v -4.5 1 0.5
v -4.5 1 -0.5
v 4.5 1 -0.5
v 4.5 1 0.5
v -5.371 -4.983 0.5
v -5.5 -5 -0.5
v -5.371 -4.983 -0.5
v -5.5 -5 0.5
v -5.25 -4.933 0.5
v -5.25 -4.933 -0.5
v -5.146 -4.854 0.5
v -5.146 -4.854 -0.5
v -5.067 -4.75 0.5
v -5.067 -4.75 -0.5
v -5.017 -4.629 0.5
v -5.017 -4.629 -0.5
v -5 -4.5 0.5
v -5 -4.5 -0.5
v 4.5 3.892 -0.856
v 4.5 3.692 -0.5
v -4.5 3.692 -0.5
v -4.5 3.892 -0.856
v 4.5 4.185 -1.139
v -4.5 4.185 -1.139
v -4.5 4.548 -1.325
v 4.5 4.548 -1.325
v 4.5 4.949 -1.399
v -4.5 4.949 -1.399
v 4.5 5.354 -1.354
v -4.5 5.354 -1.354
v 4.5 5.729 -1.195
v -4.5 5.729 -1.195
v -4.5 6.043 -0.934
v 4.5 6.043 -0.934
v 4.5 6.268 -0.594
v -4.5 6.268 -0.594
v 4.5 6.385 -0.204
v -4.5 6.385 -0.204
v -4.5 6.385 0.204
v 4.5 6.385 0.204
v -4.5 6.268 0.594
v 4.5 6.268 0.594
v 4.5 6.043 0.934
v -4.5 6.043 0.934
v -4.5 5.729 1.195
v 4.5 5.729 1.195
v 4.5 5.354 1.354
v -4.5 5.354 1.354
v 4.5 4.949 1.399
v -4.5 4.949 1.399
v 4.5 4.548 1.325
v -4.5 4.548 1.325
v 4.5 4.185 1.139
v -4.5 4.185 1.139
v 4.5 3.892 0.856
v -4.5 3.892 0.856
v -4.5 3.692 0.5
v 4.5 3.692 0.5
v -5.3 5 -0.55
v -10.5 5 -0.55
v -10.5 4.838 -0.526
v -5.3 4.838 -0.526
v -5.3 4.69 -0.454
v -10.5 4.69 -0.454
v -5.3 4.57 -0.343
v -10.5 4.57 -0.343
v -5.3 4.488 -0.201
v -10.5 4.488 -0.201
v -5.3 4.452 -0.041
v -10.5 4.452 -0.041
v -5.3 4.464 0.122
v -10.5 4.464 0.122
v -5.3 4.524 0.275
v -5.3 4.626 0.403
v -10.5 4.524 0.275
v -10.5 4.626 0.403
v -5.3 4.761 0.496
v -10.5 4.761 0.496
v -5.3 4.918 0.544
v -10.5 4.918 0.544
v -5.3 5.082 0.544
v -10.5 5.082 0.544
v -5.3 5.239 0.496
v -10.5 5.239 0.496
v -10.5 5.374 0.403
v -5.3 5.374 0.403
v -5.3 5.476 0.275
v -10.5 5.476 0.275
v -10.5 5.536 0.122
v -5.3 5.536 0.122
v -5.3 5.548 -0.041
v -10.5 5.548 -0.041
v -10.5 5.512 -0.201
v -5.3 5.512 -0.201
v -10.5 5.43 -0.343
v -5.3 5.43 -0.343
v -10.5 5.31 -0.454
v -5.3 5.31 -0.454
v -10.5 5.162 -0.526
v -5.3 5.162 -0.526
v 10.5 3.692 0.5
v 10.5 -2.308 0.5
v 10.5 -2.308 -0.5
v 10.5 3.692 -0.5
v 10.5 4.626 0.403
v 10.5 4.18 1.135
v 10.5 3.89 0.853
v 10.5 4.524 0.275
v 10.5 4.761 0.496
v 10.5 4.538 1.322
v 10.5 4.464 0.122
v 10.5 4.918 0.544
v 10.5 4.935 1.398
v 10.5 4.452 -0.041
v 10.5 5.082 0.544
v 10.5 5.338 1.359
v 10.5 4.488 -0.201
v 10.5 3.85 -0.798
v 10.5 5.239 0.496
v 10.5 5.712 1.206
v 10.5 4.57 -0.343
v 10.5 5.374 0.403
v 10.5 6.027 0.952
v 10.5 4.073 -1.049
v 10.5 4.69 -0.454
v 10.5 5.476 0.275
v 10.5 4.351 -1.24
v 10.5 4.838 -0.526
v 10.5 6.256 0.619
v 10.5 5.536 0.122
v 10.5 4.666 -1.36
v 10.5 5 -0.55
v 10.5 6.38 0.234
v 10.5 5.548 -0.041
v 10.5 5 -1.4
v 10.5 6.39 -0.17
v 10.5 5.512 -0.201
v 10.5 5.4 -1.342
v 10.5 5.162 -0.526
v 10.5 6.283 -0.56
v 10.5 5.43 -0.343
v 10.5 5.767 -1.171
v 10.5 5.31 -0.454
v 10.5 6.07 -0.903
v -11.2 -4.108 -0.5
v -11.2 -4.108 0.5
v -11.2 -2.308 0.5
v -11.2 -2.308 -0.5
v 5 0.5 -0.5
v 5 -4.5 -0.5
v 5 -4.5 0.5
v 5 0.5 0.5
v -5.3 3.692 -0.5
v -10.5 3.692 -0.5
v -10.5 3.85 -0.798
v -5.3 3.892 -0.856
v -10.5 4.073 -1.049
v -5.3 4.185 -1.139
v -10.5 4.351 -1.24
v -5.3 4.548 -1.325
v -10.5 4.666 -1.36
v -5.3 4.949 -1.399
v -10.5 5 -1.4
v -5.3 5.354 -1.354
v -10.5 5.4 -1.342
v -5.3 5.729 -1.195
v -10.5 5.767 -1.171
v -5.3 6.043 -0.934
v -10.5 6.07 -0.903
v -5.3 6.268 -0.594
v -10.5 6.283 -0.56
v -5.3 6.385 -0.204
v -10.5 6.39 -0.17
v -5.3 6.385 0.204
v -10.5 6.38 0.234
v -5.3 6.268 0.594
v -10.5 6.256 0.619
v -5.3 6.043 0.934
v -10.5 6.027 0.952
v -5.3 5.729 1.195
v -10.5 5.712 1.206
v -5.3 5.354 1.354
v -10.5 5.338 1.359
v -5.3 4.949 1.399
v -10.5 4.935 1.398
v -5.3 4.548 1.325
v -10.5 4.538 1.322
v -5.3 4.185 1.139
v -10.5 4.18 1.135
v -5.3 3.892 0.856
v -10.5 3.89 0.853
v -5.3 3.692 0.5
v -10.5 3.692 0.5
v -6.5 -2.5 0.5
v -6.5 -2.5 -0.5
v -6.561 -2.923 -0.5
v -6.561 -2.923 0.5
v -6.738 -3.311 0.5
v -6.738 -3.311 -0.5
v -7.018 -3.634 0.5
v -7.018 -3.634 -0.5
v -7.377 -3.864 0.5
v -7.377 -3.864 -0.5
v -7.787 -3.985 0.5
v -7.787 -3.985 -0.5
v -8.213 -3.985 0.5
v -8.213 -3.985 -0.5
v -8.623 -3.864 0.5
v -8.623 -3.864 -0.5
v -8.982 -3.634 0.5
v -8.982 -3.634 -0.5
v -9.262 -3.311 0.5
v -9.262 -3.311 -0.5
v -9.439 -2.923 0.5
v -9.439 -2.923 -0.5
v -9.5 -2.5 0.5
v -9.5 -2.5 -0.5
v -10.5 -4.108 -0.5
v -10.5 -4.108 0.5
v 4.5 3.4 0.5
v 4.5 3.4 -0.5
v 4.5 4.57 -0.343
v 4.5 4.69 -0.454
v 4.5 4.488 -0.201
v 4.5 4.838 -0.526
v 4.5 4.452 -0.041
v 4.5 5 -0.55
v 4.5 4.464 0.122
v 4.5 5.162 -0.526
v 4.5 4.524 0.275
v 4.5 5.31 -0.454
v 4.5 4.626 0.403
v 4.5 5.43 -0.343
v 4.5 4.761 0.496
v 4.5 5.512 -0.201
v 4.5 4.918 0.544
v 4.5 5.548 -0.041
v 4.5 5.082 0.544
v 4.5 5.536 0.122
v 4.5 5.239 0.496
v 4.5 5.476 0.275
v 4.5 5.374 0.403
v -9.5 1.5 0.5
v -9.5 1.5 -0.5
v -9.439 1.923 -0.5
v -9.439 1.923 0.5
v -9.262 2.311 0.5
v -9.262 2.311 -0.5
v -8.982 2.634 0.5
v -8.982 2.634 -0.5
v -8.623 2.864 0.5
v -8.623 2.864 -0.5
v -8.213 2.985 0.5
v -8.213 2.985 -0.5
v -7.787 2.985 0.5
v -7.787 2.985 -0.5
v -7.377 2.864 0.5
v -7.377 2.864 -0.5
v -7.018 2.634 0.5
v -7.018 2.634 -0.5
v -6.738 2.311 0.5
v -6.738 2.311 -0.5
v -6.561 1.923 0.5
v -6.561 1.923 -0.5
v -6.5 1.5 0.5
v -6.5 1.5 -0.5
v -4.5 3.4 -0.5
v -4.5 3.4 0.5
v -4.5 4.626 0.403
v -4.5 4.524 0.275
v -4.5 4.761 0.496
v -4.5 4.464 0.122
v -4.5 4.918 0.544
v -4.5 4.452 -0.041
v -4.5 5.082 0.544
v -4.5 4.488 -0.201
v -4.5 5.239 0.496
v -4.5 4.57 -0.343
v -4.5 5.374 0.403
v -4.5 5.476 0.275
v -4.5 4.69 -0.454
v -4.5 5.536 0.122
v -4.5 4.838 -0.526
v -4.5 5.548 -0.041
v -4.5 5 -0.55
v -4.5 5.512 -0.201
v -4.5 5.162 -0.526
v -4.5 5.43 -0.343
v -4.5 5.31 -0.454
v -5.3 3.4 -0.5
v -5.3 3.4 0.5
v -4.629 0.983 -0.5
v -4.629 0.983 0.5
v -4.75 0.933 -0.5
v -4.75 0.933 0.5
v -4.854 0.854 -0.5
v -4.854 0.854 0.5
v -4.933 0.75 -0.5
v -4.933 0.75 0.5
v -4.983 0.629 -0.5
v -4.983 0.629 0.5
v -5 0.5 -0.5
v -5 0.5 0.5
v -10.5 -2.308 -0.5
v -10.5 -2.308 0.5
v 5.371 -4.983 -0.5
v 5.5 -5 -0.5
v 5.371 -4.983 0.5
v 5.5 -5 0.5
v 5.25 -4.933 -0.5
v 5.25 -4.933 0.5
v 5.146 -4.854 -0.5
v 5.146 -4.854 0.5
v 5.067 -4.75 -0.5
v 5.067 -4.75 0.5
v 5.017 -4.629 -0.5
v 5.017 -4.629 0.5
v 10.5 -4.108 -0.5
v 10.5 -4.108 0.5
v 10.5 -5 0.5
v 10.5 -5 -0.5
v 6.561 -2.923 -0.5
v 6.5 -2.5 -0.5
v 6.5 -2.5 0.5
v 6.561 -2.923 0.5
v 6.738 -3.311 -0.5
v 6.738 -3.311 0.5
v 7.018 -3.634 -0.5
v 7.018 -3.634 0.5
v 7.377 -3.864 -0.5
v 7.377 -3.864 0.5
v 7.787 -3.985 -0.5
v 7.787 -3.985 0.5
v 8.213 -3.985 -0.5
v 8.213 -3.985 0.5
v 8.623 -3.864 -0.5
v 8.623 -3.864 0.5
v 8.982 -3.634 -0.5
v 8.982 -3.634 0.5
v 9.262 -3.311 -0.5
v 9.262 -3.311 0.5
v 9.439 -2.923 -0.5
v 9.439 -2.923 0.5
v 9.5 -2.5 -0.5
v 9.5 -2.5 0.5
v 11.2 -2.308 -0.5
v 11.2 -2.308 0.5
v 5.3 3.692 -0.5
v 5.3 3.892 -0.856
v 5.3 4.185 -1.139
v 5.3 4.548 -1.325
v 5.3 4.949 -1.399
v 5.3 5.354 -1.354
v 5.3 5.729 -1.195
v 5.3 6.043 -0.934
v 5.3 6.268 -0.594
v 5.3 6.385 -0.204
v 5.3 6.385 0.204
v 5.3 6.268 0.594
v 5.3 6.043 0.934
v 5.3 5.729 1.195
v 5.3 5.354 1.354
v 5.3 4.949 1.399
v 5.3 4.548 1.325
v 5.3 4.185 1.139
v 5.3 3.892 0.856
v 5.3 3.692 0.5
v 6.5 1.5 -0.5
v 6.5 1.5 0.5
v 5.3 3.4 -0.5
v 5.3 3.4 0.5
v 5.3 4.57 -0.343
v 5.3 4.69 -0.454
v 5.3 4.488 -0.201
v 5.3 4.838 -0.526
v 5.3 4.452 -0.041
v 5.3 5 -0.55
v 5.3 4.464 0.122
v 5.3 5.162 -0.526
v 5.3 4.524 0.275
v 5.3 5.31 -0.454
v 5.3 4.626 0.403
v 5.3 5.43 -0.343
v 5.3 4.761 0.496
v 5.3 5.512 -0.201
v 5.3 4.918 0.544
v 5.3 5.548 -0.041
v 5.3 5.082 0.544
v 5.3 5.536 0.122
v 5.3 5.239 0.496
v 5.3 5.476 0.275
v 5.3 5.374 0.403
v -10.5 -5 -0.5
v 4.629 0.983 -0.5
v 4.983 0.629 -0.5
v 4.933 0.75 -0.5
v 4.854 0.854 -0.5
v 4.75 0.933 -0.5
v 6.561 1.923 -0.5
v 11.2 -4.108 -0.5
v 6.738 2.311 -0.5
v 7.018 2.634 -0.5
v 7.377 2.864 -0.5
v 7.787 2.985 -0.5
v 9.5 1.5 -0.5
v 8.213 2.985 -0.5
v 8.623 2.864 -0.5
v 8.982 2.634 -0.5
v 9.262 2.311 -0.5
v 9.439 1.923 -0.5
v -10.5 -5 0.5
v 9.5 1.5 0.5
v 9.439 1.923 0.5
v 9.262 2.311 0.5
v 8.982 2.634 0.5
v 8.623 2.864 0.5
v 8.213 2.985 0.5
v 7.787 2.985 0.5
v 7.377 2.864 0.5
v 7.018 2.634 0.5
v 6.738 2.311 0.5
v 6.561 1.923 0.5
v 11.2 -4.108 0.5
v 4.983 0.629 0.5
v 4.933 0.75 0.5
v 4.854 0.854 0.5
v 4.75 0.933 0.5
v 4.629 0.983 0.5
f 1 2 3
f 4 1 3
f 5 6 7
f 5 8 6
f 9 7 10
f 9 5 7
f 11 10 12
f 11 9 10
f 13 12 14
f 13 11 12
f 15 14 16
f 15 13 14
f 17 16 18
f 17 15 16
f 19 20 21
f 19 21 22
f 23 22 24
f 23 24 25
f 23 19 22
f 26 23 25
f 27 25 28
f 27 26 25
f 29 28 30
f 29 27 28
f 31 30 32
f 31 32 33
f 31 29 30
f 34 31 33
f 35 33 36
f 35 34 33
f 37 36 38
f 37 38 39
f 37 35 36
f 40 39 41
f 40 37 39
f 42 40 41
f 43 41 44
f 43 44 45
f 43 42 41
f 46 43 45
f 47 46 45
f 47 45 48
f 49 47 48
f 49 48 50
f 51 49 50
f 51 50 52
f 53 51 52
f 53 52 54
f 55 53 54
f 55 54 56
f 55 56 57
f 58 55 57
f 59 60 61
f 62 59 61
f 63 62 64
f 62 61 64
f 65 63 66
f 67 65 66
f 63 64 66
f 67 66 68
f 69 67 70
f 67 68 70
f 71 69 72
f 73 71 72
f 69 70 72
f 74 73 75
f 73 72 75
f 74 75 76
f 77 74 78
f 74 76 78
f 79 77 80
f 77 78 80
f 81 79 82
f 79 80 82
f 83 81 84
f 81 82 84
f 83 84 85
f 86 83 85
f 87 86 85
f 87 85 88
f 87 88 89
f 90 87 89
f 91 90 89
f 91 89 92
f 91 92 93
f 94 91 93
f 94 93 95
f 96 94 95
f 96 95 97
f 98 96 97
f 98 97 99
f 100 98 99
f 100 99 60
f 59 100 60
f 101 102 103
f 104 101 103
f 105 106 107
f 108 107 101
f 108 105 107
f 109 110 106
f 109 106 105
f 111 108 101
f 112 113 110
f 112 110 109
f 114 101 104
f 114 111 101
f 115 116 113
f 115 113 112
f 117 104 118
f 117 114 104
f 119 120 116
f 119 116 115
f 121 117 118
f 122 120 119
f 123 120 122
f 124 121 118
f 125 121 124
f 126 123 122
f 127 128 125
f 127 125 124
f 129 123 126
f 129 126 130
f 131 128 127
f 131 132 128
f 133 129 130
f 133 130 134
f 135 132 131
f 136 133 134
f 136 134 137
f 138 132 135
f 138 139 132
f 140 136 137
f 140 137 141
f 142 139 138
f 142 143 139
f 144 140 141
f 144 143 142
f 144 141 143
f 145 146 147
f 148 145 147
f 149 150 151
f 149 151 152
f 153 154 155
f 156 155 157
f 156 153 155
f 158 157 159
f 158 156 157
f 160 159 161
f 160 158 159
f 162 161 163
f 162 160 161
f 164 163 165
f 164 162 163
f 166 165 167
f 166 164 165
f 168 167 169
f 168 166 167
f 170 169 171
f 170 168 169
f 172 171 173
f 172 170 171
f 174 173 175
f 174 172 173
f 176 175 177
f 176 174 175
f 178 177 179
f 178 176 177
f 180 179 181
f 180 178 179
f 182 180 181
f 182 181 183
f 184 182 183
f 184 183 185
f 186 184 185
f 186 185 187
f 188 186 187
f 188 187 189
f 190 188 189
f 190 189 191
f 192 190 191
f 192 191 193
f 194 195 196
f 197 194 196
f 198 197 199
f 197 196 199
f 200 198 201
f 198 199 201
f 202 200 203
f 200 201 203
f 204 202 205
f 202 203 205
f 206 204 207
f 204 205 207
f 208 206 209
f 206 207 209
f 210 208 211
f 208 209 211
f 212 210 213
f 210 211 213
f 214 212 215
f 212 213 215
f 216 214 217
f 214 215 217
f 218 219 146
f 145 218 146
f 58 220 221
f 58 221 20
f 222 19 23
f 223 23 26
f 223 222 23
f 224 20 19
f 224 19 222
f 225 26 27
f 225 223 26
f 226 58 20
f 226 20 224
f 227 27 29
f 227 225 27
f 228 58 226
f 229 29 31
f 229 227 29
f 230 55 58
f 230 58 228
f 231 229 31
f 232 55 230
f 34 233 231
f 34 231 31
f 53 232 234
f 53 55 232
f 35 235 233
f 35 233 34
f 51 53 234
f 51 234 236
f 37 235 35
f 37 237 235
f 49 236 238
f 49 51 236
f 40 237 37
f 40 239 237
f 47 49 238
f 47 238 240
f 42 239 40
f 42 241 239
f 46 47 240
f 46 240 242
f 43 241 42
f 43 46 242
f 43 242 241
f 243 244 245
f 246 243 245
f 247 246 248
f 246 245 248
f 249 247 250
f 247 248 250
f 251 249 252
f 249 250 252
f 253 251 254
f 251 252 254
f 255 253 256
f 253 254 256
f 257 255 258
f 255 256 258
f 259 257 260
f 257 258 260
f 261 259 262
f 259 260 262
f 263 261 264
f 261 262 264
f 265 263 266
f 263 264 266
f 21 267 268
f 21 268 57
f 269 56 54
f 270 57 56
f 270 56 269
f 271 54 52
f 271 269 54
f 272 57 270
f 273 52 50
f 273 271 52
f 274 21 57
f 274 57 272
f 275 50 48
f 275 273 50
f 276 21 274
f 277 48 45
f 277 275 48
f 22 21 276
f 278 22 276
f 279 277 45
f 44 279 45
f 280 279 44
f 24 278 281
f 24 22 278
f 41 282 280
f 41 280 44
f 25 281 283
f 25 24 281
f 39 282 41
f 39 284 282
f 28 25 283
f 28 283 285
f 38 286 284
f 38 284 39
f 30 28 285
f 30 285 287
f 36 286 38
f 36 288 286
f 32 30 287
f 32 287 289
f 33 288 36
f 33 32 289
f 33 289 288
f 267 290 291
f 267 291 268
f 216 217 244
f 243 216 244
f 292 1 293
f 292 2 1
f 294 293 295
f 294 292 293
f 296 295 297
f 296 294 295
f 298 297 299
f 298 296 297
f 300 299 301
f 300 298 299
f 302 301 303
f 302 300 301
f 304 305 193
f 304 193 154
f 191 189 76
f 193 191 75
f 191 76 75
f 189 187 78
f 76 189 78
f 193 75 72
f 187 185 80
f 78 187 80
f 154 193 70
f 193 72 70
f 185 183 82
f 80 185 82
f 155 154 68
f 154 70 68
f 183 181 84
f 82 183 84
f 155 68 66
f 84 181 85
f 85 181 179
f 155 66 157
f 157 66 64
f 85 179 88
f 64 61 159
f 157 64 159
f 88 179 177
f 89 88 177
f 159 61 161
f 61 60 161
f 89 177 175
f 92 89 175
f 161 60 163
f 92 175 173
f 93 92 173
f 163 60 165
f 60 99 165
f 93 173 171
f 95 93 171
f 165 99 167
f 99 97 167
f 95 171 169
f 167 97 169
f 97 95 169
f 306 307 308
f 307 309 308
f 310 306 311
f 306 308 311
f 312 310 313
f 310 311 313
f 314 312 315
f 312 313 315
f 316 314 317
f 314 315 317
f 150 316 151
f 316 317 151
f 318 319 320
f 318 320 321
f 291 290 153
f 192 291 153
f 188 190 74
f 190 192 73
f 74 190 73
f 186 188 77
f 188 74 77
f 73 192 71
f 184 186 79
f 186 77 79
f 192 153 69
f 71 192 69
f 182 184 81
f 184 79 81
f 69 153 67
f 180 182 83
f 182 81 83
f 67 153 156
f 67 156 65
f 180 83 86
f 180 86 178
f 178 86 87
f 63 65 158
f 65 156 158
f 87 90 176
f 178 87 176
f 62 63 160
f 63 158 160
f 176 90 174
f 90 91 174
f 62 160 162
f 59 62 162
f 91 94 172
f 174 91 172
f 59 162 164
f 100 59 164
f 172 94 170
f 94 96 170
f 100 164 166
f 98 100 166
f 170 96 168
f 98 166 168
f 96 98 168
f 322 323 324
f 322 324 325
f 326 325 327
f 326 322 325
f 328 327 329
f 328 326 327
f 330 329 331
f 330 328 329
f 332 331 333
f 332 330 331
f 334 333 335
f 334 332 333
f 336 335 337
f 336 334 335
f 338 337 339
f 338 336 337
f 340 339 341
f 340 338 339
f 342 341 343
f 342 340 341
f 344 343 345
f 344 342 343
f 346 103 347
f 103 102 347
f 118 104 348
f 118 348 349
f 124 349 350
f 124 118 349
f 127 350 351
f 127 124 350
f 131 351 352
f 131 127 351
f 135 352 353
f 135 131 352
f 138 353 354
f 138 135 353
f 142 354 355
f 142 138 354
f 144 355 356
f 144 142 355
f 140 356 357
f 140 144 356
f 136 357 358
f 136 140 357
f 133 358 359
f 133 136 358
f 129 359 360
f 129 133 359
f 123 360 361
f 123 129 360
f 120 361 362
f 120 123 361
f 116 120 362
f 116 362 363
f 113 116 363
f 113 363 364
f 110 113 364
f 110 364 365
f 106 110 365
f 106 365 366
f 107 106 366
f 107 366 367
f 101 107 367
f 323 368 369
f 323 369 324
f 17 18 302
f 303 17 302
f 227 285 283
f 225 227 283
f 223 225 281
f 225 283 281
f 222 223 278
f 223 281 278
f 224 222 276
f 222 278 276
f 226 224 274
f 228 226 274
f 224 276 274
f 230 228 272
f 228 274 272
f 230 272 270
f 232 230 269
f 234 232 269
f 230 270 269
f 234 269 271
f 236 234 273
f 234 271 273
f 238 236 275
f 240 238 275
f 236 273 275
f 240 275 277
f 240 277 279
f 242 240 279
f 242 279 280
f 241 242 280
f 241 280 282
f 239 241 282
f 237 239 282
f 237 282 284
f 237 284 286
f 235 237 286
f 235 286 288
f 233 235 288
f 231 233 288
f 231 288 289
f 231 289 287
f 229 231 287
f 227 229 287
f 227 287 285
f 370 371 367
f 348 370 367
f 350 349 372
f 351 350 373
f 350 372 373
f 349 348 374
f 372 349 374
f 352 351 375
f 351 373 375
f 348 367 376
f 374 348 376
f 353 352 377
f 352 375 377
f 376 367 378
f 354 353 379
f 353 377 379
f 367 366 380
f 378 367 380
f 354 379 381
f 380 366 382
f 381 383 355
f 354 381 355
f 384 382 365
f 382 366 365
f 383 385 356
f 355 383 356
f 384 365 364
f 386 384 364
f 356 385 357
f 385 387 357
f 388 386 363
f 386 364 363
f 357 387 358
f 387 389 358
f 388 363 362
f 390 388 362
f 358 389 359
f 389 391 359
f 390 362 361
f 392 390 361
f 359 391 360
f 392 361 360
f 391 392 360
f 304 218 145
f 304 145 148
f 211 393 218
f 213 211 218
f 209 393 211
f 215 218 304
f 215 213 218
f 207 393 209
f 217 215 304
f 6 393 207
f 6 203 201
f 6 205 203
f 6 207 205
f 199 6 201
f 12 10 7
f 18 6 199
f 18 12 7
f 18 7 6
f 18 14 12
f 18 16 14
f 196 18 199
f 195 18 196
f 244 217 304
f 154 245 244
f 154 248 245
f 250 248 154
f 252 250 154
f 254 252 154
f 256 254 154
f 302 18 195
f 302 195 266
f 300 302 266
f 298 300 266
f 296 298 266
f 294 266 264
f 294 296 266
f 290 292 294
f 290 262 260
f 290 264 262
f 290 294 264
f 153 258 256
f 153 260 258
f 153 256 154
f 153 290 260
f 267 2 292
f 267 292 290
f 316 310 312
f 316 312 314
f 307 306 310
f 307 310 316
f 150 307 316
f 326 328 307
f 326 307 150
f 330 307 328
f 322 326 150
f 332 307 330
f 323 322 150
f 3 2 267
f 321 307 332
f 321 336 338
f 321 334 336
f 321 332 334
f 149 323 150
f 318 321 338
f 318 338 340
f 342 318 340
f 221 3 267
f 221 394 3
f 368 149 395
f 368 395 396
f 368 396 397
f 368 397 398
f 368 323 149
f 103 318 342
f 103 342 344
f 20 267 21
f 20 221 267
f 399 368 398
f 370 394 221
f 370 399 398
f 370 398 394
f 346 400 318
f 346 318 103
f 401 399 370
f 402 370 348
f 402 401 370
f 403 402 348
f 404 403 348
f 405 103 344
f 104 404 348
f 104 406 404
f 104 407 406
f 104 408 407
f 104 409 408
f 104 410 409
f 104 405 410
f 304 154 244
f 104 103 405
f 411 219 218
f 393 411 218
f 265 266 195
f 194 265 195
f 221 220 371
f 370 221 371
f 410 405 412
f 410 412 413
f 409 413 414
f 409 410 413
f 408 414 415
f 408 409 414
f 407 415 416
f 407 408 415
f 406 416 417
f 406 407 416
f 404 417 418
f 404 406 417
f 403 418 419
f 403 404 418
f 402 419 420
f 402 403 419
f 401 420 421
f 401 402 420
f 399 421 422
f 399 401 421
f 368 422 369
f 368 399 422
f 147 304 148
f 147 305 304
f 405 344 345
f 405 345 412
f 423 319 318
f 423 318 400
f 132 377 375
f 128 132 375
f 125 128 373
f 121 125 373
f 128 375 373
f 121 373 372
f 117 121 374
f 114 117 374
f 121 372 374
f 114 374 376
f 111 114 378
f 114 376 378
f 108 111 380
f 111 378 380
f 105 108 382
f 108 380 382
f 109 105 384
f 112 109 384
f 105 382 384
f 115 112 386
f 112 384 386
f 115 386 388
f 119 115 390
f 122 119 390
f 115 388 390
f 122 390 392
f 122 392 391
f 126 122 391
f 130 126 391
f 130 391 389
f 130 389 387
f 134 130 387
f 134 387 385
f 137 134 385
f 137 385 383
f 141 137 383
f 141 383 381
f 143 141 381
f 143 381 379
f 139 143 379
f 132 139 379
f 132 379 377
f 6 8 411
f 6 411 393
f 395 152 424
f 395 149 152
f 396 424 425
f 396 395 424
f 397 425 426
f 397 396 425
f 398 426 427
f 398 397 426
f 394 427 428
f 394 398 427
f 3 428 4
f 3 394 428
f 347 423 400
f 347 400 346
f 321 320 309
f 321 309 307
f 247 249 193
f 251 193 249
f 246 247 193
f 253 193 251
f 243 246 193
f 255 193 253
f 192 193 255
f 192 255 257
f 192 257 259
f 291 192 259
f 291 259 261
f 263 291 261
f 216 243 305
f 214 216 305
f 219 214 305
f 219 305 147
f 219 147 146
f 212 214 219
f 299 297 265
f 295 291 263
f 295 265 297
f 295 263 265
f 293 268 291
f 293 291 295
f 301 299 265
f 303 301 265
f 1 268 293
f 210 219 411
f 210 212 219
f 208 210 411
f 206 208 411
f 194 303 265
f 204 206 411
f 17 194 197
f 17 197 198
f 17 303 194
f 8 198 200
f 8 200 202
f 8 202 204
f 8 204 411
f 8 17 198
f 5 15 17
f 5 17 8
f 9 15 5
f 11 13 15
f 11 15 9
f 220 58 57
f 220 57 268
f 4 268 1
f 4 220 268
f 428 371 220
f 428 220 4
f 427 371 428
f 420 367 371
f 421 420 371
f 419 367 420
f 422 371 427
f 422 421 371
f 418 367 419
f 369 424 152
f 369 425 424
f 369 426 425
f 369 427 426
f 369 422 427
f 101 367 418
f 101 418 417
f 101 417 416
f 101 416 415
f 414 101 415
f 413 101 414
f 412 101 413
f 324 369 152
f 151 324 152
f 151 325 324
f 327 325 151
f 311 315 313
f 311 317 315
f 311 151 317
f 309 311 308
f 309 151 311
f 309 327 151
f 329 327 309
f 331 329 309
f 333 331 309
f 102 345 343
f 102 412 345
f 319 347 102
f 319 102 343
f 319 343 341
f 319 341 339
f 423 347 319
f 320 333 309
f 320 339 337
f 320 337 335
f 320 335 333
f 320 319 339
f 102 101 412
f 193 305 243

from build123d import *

# Parameters (mm, degrees)
BOSS_EXTRUDE1_DEPTH     = 10.5
SKETCH2_W               = 10
SKETCH2_H               = 6
SKETCH2_W_2             = 0.8
SKETCH2_H_2             = 3
CUT_EXTRUDE1_DEPTH      = 10.5
M1_4X0_3_TAPPED_HOLE1_D = 1.1
SKETCH4_W               = 0.7
SKETCH4_H               = 1.8
BOSS_EXTRUDE2_DEPTH     = 0.5
FILLET1_R               = 0.5


with BuildPart() as part:
    # Sketch1 → Boss-Extrude1 (new, symmetric)
    with BuildSketch(Plane(origin=(0, 0, 0), x_dir=(0, 0, -1), z_dir=(1, 0, 0))):
        with BuildLine():
            Line((-0.5, 3.692330317), (-0.5, 5))
            Line((-0.5, 5), (0.5, 5))
            Line((0.5, 5), (0.5, 3.692330317))
            ThreePointArc((0.5, 3.692330317), (1.153256259, 4.206274607), (1.4, 5))
            ThreePointArc((1.4, 5), (-0.793725393, 6.153256259), (-0.5, 3.692330317))
        make_face()
        with BuildLine():
            Line((0.5, 5), (-0.5, 5))
            Line((-0.5, 5), (-0.5, 3.692330317))
            ThreePointArc((-0.5, 3.692330317), (0, 3.6), (0.5, 3.692330317))
            Line((0.5, 3.692330317), (0.5, 5))
        make_face()
        with BuildLine():
            ThreePointArc((0.5, 3.692330317), (0, 3.6), (-0.5, 3.692330317))
            Line((-0.5, 3.692330317), (-0.5, -5))
            Line((-0.5, -5), (0.5, -5))
            Line((0.5, -5), (0.5, 3.692330317))
        make_face()
    extrude(amount=BOSS_EXTRUDE1_DEPTH, both=True)

    # Sketch2 → Cut-Extrude1 (cut, symmetric)
    with BuildSketch(Plane.XY.offset(0.5)):
        with Locations((0, -2)):
            Rectangle(SKETCH2_W, SKETCH2_H)
        with Locations((-4.9, 4.9)):
            Rectangle(SKETCH2_W_2, SKETCH2_H_2)
        with BuildLine():
            Line((-6.5, 1.5), (-6.5, -2.5))
            ThreePointArc((-6.5, -2.5), (-8, -4), (-9.5, -2.5))
            Line((-9.5, -2.5), (-9.5, 1.5))
            ThreePointArc((-9.5, 1.5), (-8, 3), (-6.5, 1.5))
        make_face()
        with BuildLine():
            Line((6.5, 1.5), (6.5, -2.5))
            ThreePointArc((6.5, -2.5), (8, -4), (9.5, -2.5))
            Line((9.5, -2.5), (9.5, 1.5))
            ThreePointArc((9.5, 1.5), (8, 3), (6.5, 1.5))
        make_face()
        with Locations((4.9, 4.9)):
            Rectangle(SKETCH2_W_2, SKETCH2_H_2)
    extrude(amount=CUT_EXTRUDE1_DEPTH, both=True, mode=Mode.SUBTRACT)

    # M1.4x0.3 Tapped Hole1 (through all)
    with Locations(Plane(origin=(10.5, 5, 0), x_dir=(0, 0, 1), z_dir=(1, 0, 0))):
        with Locations((0, 0)):
            Hole(M1_4X0_3_TAPPED_HOLE1_D / 2)

    # Sketch4 → Boss-Extrude2 (add, symmetric)
    with BuildSketch(Plane.XY):
        with Locations((10.85, -3.207669683)):
            Rectangle(SKETCH4_W, SKETCH4_H)
    boss_extrude2 = extrude(amount=BOSS_EXTRUDE2_DEPTH, both=True)

    # Mirror1: Boss-Extrude2 across plane
    add(boss_extrude2.mirror(Plane(origin=(0, 0, 0), x_dir=(0, 0, 1), z_dir=(1, 0, 0))))

    # Fillet1
    fillet1_edges = [part.edges().sort_by_distance(p)[0] for p in [
        (-5, -5, 0),
        (-5, 1, 0),
        (5, 1, 0),
        (5, -5, 0),
    ]]
    fillet(fillet1_edges, radius=FILLET1_R)


solid = part.part
